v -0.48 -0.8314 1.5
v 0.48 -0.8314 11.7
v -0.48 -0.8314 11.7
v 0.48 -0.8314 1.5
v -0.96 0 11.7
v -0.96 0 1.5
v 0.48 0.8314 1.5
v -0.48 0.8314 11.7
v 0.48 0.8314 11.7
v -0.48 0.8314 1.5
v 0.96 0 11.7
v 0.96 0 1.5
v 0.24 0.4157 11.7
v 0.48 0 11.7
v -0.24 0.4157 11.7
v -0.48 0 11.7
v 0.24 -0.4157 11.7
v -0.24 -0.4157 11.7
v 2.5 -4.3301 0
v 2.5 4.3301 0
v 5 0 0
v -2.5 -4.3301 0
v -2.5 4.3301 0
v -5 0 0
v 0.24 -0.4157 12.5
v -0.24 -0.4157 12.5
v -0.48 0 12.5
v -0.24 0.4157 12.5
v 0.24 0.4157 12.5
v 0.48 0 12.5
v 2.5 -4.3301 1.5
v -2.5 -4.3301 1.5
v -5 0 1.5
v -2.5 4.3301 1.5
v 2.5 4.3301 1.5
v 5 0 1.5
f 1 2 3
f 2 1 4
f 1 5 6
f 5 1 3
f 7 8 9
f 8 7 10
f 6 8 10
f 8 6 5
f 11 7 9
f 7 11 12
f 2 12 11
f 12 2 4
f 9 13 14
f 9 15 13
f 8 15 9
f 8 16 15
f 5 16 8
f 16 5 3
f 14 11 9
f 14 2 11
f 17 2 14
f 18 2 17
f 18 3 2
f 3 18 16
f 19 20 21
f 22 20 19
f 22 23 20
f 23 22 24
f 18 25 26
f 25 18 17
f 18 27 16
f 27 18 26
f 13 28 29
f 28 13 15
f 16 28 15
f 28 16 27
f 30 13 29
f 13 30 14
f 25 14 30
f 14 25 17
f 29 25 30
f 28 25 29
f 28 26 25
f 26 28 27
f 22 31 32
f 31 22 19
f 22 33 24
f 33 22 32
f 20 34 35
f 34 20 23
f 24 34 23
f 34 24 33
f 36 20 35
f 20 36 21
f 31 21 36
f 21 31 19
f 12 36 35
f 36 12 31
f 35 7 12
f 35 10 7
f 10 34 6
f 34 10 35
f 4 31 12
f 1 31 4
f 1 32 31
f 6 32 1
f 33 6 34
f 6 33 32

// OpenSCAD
// file: ../cookie_cutter.scad
// Cookie cutter generator
// Pau Fernández <pauek@minidosis.org>
// GNU GPL v2

module dxf(file, layer, height) {
   orig = dxf_cross(file = file, layer = layer);
   echo("origin: ", orig);
   translate([-orig[0], -orig[1], 0])
      linear_extrude(height = height)
         import(file = file, layer = layer);
}

module needle(height, thin1, thin2) {
   union() {
      cylinder(r = thin1, h = height-0.8, $fn = 6);
      cylinder(r = thin2, h = height, $fn = 6);
   }
}

module wall(file, layer, height, thin) {
   difference() {
      minkowski() {
        dxf(file, layer, 0.01);
        cylinder(r = thin, h = height, $fn = 6);
      }
      translate([0, 0, -1]) dxf(file, layer, height + 2);
   }
}

module cutter(file, layer, height, nozzle_diameter) {
   thin1 = nozzle_diameter * 2.4;
   thin2 = nozzle_diameter * 1.2;
   difference() {
      minkowski() {
        dxf(file, layer, 0.01);
        needle(height, thin1, thin2);
      }
      translate([0, 0, -1]) dxf(file, layer, height + 2);
   }
}

module cookie_cutter(file, height, join_height, nozzle_diameter) {
   union () {
      cutter(file, "cutter", height, nozzle_diameter);
      wall(file, "outer", 1, 5);
   }
}

module cookie_cutter_join(file, height, nozzle_diameter) {
   mirror([1, 0, 0]) union () {
      cutter(file, "cutter", height, nozzle_diameter);
      wall(file, "outer", 1.5, 5);
      dxf(file, "join", 1.5);
   }
}
// main file
include <../cookie_cutter.scad>;
cookie_cutter_join("A.dxf", 12.5, 0.4);
